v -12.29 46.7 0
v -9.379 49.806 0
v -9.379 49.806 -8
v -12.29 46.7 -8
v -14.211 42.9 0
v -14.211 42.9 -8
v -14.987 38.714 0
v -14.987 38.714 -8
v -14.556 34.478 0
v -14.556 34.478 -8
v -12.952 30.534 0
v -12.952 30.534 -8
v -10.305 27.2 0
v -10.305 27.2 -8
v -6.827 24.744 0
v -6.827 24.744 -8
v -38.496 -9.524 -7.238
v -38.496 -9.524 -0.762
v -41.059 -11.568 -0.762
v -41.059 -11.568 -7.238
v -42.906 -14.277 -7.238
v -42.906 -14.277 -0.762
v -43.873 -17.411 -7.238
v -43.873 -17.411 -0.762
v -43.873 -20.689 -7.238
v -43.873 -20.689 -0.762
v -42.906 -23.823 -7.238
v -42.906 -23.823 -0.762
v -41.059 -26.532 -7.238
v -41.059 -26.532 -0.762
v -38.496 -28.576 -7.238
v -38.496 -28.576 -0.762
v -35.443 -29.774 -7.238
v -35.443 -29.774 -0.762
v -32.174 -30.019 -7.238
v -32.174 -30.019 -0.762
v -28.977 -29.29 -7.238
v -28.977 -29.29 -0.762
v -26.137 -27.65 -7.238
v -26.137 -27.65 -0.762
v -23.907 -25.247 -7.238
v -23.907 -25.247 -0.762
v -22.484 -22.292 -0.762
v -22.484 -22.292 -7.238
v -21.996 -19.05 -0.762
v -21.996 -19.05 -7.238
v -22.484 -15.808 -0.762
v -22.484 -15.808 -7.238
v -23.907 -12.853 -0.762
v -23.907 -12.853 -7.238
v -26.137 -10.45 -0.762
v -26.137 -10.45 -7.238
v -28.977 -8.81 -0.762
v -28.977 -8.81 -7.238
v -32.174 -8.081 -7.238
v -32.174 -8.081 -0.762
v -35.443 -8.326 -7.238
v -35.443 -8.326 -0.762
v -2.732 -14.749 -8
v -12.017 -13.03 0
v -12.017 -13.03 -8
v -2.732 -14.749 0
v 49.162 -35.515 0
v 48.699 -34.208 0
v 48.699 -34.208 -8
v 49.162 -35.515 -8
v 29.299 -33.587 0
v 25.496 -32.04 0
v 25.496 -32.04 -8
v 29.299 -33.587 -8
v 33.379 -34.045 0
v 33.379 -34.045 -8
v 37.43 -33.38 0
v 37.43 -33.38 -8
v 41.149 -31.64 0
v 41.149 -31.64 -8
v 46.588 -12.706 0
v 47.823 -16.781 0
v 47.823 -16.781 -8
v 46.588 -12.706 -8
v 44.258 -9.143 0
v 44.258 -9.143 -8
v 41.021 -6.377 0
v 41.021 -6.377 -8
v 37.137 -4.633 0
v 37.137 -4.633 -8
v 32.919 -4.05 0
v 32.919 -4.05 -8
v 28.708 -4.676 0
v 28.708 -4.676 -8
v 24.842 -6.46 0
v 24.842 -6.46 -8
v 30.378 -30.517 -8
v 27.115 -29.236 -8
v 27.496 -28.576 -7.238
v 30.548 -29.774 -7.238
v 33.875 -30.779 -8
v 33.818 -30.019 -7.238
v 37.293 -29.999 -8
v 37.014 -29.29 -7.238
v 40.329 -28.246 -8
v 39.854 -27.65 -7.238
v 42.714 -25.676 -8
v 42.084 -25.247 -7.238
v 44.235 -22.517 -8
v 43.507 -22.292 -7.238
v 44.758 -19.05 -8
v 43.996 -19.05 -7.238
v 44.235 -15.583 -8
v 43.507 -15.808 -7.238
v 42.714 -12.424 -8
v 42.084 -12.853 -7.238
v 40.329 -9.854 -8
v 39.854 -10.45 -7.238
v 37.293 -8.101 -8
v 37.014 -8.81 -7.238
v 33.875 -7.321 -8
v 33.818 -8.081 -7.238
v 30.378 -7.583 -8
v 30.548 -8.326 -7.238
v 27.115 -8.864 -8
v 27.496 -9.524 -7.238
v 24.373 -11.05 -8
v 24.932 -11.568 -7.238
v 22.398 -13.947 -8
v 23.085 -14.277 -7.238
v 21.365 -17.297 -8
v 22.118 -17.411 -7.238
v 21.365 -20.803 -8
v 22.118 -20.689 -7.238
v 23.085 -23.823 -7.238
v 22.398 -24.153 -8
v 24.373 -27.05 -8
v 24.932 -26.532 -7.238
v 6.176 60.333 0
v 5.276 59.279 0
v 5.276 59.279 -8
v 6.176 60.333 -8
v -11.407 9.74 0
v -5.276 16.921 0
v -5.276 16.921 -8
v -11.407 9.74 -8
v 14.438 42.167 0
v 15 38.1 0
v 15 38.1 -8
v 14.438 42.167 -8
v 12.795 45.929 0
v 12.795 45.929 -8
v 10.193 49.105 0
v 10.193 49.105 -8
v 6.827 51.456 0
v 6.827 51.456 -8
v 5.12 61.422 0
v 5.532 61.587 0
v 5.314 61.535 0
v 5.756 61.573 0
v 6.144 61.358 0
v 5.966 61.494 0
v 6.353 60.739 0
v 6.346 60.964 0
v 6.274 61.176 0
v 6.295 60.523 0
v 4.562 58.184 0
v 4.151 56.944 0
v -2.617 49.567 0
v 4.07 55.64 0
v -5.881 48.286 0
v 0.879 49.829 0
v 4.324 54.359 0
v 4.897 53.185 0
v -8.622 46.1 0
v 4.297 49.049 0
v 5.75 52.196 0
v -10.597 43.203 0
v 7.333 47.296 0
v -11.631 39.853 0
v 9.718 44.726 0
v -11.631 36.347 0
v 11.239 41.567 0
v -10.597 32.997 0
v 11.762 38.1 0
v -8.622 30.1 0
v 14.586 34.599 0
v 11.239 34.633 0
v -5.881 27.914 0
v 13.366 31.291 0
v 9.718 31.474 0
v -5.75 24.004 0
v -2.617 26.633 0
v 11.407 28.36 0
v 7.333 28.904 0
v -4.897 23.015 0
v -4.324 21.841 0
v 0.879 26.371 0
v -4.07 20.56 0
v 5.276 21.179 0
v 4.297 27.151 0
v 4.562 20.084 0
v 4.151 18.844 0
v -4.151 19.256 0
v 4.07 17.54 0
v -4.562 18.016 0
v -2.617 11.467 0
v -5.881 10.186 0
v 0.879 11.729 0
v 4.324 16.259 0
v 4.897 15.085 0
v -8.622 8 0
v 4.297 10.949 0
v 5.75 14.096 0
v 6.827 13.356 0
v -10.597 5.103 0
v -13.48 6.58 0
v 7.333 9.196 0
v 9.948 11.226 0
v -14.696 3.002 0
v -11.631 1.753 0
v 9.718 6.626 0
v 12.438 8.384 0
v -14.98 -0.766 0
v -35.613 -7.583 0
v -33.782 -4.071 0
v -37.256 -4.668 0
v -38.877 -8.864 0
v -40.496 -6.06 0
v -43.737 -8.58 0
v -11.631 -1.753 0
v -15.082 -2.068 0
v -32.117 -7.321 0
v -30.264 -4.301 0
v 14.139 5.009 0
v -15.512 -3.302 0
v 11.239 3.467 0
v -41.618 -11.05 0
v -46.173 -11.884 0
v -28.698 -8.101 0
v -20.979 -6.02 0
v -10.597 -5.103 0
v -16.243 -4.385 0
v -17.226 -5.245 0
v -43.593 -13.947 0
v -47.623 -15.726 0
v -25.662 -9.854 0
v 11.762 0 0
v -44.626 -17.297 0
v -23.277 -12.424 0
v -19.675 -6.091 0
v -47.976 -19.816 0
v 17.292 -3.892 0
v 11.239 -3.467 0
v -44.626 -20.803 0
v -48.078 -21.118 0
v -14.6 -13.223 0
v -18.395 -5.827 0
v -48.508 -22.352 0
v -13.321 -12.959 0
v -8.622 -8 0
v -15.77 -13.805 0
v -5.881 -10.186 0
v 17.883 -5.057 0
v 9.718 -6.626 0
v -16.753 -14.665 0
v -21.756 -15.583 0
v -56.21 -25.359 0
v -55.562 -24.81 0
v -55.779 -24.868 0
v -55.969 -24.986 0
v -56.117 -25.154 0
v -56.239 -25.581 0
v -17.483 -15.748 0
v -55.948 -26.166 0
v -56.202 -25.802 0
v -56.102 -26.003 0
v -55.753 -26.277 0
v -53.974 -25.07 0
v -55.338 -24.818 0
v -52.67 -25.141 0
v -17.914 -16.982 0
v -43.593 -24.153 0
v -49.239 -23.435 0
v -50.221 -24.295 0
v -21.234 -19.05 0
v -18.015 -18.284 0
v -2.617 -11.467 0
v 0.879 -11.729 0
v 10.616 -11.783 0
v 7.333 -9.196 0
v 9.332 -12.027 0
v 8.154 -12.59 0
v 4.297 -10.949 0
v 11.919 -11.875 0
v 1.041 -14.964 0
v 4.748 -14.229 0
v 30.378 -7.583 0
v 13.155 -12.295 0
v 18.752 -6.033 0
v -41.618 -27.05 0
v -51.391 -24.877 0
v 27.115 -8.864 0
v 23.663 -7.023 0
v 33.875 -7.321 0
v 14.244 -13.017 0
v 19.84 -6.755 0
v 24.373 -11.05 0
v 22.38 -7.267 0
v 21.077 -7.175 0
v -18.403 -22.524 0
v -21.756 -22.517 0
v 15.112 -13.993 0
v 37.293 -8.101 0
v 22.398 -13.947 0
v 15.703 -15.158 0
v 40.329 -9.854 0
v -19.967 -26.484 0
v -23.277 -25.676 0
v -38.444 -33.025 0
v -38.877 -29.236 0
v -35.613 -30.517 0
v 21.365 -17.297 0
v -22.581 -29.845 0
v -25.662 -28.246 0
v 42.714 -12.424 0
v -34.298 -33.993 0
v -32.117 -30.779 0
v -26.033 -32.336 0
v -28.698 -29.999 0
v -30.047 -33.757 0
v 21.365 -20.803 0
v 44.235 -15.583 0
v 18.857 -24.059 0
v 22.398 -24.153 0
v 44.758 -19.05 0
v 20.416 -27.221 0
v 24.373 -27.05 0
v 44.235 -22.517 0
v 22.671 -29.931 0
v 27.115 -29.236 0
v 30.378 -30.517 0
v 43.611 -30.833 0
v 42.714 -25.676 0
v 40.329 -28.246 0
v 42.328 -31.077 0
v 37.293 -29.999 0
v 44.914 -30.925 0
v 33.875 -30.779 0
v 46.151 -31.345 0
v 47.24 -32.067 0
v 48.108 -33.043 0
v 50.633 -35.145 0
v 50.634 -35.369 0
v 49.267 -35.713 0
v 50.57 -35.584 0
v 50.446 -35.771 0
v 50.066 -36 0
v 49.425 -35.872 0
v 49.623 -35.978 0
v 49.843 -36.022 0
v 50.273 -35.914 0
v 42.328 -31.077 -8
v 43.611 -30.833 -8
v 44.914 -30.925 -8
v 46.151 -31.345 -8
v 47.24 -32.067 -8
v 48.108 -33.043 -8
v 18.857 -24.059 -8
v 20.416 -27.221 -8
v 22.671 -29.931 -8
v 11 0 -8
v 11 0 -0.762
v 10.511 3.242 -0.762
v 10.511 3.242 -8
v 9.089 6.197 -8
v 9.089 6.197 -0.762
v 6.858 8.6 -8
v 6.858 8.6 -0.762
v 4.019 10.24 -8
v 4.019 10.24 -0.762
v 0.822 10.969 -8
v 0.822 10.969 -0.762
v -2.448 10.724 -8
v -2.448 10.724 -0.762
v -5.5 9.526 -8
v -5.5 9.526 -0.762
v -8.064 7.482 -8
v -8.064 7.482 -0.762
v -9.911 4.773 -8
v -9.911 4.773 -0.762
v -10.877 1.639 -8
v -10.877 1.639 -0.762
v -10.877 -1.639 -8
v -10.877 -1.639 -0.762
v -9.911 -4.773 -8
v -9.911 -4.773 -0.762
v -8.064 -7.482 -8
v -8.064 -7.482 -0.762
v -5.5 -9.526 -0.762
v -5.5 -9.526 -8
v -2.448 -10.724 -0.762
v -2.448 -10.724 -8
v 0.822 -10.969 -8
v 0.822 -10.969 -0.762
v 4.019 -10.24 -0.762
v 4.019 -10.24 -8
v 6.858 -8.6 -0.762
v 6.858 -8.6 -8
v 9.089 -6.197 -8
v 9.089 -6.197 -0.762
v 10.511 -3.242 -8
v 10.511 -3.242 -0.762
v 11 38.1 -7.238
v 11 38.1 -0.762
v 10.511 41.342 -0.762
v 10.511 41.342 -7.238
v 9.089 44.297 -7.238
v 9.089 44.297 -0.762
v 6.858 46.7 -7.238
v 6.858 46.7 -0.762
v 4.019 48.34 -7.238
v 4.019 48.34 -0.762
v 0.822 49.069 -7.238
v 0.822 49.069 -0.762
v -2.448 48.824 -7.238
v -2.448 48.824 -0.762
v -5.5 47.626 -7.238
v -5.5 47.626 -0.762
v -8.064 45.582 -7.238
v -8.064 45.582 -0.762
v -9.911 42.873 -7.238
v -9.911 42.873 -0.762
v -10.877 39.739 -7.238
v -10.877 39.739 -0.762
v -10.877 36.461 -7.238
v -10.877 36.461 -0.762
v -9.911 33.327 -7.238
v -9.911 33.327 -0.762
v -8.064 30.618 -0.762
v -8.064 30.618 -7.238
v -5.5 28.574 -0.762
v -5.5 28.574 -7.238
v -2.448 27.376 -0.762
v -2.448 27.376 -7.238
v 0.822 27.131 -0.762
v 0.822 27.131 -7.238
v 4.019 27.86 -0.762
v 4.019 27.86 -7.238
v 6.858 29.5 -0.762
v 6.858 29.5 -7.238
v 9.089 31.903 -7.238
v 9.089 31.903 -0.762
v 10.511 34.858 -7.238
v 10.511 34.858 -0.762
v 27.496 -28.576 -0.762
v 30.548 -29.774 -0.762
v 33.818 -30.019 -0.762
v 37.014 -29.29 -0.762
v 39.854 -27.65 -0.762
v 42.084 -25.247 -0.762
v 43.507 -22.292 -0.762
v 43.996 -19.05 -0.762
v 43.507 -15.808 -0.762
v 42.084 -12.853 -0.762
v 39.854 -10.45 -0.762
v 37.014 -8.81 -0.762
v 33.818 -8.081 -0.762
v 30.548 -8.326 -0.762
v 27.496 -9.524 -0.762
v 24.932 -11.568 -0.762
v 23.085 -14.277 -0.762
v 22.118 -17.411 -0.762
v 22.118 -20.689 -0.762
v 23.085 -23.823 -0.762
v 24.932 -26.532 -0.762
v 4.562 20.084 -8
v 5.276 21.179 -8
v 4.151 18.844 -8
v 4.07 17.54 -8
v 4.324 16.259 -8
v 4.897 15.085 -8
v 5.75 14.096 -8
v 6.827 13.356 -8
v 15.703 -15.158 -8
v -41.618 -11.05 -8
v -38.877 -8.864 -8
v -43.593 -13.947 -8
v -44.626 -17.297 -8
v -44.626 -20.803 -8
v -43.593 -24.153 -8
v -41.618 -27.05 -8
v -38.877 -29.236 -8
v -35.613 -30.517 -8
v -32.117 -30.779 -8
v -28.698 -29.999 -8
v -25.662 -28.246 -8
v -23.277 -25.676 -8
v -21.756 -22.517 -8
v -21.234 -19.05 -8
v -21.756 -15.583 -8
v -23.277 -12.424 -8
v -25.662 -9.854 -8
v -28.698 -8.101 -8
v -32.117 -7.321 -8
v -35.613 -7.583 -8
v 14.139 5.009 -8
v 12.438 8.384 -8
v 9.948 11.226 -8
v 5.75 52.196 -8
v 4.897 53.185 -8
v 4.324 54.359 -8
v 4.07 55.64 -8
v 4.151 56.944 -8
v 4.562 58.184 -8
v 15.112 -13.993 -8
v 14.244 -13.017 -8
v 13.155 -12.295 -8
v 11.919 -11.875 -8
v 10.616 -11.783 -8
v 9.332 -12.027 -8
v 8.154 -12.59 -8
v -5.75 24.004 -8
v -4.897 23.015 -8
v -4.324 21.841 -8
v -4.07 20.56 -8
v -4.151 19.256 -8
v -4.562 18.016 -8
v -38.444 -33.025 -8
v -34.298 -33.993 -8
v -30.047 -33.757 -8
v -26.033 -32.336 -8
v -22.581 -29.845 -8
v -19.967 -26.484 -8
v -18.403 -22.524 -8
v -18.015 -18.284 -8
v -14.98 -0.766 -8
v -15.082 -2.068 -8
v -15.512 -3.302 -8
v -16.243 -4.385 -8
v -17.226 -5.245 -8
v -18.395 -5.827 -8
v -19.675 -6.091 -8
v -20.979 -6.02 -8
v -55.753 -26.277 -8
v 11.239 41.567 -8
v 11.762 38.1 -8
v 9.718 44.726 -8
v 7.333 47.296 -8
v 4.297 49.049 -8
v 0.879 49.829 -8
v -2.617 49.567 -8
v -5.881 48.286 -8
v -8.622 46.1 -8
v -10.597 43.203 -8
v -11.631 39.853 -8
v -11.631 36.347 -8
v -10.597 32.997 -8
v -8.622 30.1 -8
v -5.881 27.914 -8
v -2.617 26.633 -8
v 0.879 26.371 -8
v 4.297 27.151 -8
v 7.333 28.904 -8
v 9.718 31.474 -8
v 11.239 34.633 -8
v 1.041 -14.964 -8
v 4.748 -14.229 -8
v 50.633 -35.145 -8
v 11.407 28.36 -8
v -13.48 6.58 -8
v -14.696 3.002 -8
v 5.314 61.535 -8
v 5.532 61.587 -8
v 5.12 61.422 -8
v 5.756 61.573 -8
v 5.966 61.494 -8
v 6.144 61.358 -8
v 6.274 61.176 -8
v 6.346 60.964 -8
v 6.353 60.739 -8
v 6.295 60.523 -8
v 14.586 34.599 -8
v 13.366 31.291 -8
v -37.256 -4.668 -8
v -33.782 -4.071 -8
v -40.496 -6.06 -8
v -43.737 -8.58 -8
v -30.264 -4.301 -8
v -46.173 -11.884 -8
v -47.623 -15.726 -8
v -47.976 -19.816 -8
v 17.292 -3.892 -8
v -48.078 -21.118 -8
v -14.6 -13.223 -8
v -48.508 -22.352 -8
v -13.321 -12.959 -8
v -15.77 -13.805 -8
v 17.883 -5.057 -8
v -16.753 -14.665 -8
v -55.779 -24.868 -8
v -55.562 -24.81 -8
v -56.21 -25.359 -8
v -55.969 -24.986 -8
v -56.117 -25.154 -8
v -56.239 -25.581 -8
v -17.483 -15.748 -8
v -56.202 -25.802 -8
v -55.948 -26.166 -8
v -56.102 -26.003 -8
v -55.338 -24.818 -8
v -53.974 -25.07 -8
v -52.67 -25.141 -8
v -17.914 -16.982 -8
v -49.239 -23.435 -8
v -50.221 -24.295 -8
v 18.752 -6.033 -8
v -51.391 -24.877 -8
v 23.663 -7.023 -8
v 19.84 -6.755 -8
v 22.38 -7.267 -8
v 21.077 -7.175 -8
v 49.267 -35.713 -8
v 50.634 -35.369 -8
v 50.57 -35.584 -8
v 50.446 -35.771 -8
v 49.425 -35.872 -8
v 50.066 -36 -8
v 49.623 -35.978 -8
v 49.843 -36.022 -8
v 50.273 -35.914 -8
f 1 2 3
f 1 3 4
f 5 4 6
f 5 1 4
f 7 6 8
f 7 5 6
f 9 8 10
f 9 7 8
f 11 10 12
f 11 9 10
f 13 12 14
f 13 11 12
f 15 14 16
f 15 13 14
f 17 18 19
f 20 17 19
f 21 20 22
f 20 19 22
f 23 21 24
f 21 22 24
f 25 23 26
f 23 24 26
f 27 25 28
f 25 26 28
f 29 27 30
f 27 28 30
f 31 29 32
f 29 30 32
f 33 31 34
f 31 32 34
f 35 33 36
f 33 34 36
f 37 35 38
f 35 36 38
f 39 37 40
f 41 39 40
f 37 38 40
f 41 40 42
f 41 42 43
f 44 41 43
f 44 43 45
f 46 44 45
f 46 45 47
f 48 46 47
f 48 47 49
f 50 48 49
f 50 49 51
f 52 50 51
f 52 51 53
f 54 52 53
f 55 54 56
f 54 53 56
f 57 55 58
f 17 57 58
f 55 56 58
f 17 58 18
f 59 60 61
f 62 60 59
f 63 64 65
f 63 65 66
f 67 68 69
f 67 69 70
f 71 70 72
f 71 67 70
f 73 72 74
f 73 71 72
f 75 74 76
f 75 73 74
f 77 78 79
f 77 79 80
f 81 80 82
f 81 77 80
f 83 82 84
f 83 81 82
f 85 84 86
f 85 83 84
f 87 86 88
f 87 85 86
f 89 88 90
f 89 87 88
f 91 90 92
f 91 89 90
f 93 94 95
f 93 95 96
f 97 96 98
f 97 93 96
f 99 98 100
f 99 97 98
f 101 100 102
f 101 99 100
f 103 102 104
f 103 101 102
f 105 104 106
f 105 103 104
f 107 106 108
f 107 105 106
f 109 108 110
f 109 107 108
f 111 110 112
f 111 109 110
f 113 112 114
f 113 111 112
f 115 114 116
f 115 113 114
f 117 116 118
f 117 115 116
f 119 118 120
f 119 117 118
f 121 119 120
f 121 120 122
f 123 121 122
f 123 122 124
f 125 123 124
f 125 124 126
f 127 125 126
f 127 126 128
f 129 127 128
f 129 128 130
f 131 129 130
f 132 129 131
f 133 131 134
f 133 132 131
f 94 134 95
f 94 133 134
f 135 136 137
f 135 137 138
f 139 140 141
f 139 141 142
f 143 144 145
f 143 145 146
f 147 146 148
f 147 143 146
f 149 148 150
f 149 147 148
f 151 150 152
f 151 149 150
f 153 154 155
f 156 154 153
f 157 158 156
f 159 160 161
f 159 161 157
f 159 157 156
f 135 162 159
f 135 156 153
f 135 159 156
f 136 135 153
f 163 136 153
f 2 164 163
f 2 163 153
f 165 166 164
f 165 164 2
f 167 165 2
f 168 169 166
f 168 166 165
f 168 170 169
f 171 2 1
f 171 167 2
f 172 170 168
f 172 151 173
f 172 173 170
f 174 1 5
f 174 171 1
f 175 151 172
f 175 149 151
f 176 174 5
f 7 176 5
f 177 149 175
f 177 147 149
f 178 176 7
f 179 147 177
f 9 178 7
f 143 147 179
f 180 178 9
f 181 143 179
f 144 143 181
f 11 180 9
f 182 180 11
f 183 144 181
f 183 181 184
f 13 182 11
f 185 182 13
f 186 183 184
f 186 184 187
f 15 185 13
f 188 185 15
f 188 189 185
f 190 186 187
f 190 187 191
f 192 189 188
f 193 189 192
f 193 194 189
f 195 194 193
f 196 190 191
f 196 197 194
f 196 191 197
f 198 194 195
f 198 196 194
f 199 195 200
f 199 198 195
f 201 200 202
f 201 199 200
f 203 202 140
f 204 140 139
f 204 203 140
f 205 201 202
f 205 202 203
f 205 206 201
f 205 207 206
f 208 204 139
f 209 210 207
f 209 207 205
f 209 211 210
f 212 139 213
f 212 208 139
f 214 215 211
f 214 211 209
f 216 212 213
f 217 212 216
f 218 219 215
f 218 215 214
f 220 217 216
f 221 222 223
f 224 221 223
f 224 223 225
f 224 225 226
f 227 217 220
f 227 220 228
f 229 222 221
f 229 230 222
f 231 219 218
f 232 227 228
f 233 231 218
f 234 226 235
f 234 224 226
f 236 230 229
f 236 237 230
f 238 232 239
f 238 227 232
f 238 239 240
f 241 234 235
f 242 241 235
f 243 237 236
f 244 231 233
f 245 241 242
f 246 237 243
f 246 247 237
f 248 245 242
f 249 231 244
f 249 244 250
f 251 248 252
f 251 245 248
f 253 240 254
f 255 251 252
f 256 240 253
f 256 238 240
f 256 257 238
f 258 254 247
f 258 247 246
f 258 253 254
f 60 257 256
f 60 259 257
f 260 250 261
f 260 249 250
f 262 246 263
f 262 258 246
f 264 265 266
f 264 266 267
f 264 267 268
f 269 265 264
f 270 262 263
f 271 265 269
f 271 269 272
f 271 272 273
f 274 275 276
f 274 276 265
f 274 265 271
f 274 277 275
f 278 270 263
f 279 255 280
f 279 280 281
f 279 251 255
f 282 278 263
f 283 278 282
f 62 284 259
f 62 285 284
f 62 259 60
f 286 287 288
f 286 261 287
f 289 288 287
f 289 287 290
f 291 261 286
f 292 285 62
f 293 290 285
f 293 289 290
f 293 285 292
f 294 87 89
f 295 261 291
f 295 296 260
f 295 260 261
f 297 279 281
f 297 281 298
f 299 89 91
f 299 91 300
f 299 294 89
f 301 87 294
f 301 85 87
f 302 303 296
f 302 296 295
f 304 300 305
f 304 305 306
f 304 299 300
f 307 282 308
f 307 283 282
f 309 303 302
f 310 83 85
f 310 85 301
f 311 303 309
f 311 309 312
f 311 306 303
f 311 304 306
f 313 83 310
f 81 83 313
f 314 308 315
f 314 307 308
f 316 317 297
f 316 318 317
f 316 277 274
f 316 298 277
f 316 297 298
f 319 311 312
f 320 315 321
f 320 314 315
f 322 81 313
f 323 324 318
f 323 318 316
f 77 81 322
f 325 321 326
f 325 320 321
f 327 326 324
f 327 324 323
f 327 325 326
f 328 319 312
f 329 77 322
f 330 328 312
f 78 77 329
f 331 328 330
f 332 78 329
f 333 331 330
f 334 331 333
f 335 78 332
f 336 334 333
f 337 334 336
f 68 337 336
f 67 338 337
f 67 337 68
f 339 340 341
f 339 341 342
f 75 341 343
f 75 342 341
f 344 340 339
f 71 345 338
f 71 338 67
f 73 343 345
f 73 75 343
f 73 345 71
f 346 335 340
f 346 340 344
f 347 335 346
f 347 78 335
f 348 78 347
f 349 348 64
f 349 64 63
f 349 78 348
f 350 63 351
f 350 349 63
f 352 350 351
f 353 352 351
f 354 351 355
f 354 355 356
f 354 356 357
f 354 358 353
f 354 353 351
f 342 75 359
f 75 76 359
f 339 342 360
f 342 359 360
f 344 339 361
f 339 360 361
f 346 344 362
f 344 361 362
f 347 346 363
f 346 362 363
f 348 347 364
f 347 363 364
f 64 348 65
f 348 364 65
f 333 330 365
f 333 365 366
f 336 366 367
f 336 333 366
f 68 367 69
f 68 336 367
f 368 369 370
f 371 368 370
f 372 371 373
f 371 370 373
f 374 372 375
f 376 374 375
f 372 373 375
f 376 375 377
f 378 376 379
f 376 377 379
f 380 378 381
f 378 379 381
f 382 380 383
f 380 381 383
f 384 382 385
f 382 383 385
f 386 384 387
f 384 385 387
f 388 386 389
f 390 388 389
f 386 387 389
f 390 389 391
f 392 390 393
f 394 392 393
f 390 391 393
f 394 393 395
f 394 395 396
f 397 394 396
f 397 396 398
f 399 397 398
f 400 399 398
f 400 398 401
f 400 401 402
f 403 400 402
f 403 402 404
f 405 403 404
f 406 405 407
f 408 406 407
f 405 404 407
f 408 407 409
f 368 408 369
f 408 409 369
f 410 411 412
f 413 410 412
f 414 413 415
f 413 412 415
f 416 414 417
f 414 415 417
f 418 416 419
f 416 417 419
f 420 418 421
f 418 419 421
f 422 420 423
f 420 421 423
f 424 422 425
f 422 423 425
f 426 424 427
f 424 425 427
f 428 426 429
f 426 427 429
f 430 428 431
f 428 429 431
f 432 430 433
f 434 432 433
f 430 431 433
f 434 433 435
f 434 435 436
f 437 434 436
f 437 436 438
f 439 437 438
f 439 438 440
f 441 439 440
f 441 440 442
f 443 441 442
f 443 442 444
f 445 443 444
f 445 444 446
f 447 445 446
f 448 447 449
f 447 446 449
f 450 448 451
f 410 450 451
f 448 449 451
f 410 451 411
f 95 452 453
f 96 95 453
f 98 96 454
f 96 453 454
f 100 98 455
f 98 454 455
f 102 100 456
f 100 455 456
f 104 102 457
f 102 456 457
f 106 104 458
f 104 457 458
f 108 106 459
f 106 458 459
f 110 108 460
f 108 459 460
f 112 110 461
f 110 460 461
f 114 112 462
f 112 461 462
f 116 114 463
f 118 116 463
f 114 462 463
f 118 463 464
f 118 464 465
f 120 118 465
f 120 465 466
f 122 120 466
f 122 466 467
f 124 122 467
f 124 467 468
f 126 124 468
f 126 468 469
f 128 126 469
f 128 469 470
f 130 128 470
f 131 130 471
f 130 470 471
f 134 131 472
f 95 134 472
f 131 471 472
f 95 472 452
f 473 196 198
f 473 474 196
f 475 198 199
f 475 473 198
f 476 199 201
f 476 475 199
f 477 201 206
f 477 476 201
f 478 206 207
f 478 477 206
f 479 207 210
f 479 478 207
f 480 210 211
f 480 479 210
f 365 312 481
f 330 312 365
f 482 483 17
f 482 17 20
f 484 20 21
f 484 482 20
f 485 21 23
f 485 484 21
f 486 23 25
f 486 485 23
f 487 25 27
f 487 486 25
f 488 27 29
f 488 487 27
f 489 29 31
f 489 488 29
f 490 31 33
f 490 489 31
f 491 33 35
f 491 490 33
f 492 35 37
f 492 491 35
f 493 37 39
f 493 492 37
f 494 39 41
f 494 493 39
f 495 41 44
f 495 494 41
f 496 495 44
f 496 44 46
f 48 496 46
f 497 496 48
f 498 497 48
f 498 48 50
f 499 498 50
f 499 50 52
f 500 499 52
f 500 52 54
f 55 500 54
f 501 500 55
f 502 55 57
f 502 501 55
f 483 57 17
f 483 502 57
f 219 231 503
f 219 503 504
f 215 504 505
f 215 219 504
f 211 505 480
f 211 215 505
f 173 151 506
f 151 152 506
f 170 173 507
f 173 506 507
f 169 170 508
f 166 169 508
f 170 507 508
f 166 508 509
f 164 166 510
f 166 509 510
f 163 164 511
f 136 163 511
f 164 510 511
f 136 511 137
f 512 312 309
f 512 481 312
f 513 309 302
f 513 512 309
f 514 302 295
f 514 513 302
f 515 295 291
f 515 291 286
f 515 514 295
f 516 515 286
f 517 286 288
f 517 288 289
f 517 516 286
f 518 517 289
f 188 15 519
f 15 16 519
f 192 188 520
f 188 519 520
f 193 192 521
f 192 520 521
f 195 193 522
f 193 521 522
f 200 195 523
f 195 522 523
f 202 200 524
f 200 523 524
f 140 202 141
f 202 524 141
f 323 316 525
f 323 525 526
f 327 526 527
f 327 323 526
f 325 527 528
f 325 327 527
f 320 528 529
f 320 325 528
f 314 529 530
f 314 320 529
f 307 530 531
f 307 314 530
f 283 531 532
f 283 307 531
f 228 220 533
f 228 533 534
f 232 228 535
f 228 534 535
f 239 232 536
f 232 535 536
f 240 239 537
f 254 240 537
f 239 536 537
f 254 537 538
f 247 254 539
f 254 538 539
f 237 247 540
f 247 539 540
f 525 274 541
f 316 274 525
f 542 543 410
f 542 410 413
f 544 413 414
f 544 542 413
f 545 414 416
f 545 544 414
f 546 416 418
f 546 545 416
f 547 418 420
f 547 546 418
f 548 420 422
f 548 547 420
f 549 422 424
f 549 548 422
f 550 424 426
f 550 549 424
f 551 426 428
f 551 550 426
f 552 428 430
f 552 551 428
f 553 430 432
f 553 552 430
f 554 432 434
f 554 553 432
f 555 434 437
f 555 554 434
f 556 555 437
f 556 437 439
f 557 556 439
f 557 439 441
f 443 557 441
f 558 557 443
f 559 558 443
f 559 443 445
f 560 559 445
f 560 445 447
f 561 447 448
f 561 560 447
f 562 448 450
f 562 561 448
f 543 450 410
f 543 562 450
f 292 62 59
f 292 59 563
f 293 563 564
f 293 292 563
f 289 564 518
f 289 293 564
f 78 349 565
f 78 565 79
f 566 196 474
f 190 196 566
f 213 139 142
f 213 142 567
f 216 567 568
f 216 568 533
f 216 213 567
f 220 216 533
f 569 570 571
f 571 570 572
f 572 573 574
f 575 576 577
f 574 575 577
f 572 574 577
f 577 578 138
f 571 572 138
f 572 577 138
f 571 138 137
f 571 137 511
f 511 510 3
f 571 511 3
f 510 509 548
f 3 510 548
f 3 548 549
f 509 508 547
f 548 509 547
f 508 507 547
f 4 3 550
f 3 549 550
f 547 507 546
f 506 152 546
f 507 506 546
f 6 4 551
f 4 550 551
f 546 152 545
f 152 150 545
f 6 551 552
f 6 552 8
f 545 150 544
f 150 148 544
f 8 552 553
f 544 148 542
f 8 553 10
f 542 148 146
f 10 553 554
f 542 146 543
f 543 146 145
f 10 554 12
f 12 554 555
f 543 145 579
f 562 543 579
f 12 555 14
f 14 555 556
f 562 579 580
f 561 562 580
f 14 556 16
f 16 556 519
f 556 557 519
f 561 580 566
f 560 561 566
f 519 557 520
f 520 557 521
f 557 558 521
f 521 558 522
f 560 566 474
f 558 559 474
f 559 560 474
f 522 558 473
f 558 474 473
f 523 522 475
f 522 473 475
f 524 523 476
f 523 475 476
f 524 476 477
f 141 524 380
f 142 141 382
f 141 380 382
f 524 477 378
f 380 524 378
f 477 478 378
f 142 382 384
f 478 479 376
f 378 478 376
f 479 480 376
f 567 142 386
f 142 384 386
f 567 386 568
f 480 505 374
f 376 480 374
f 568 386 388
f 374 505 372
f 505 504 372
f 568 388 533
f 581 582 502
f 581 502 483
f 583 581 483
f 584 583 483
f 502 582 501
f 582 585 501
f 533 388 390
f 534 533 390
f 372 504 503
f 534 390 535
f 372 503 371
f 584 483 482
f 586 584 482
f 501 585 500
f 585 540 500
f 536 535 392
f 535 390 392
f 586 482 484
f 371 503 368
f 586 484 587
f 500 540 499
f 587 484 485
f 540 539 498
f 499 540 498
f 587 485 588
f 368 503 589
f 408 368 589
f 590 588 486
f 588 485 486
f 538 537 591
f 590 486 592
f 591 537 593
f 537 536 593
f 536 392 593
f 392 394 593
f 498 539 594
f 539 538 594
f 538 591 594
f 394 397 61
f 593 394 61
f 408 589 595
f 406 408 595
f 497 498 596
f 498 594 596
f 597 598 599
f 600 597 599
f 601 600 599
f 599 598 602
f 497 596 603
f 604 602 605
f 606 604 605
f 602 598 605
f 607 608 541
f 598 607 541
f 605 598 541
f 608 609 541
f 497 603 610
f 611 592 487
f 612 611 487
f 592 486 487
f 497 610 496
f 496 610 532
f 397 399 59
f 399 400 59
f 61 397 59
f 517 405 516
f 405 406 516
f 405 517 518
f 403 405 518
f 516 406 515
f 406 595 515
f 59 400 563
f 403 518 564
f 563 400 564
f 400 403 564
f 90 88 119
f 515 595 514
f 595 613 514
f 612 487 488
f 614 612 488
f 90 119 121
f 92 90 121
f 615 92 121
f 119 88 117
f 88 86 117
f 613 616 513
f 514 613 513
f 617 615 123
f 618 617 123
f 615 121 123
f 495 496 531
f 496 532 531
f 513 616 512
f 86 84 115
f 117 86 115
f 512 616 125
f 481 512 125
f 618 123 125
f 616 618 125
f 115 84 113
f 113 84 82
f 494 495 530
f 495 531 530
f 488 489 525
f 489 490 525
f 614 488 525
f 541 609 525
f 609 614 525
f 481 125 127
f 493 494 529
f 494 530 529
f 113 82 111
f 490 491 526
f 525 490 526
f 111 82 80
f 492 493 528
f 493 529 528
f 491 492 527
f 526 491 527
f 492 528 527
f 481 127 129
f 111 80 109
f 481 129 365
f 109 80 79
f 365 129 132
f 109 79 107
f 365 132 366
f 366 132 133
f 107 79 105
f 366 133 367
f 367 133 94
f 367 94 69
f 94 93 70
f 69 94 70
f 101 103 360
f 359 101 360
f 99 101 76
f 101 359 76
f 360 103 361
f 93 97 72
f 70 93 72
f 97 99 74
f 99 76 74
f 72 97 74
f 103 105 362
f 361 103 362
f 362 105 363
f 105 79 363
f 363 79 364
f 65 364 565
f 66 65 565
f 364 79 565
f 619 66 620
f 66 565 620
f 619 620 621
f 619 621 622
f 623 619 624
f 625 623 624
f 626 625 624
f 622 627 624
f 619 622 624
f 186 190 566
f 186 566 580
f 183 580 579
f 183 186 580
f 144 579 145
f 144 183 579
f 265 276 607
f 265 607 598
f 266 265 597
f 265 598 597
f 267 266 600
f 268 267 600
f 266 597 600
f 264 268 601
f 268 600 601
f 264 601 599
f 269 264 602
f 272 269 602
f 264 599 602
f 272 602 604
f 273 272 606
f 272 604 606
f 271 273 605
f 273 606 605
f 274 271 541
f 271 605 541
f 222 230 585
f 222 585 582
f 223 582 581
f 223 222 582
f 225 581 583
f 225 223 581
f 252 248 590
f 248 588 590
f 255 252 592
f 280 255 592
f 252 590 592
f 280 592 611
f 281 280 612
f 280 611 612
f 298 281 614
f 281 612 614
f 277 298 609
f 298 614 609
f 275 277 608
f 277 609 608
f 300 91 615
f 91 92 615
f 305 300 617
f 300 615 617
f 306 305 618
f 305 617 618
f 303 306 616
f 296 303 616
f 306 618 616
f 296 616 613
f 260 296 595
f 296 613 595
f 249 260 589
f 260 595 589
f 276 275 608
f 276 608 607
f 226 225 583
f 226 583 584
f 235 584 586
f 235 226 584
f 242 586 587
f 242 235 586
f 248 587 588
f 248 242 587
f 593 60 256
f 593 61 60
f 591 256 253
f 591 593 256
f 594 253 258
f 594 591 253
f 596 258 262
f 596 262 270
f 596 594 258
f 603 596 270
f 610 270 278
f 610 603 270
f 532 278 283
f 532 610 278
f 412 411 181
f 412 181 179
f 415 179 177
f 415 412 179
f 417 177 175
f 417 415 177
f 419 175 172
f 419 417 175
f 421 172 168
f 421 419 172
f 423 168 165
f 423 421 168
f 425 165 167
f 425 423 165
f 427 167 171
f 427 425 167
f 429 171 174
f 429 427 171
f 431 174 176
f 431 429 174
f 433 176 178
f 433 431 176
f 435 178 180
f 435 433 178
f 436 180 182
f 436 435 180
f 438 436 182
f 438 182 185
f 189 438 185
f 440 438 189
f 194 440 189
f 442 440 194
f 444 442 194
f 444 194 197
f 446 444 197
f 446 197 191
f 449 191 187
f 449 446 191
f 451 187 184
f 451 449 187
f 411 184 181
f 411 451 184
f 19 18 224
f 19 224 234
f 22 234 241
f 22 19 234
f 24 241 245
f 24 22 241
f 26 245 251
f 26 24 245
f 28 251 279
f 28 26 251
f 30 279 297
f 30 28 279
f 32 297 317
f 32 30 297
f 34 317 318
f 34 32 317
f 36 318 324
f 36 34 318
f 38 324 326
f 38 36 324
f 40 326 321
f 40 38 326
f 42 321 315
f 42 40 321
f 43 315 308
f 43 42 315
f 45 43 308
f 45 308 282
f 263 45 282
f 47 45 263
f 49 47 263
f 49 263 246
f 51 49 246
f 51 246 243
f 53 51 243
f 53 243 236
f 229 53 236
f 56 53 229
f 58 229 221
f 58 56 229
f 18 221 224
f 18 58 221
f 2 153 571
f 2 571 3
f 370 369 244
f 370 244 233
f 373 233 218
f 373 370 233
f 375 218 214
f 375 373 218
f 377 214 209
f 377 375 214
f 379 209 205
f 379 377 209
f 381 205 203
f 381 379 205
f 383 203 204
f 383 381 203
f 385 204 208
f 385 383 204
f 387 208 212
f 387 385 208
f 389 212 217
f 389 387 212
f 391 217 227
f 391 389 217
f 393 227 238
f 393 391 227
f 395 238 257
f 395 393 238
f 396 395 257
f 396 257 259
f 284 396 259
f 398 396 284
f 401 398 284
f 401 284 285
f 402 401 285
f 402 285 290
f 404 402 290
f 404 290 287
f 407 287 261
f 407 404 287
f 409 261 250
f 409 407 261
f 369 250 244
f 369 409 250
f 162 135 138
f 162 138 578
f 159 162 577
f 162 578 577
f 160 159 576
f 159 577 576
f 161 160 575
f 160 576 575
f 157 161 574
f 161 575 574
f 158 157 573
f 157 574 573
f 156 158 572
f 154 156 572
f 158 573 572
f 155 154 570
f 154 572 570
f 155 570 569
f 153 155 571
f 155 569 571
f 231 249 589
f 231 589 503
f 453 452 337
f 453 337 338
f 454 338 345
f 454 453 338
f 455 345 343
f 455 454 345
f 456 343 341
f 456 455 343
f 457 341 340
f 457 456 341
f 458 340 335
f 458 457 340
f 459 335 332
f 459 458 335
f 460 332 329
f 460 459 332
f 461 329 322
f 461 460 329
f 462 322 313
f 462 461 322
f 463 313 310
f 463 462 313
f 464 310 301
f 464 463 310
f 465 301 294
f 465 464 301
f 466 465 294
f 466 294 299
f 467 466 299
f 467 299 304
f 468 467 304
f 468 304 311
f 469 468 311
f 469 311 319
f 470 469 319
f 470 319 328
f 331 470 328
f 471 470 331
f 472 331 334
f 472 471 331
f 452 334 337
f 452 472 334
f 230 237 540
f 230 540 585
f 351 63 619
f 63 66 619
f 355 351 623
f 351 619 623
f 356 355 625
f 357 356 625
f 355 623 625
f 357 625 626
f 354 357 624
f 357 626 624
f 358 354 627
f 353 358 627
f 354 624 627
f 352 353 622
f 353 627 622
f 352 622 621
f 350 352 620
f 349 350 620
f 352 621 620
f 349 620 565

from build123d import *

# Parameters (mm, degrees)
F0_R            = 11
F1_DEPTH        = 8
F2_DEPTH        = 8
F2_COPIES_COUNT = 3
F3_R            = 5.08
F4_F1_R         = 0.762
F4_F2_R         = 0.762
F4_F3_R         = 0.762
F5_SIZE         = 0.762


# Not quite as in the source:
# - a pattern or mirror of a feature is missing from the dataset's text; its kind, count and spacing are read off the source's solid


with BuildPart() as f1:
    # F0 (on Top) → F1 (new body)
    with BuildSketch(Plane.XY):
        with BuildLine():
            ThreePointArc((-11.407337121, 9.7402597403), (-5.190854611, -14.0732024929), (15, 0))
            ThreePointArc((15, 0), (10.6066017178, 10.6066017178), (0, 15))
            ThreePointArc((0, 15), (-6.2807684202, 13.6217454114), (-11.407337121, 9.7402597403))
        make_face()
        Circle(F0_R, mode=Mode.SUBTRACT)
    extrude(amount=-F1_DEPTH)

    # F0 (on Top) → F2 (join, through all)
    with BuildSketch(Plane.XY):
        with BuildLine():
            ThreePointArc((-11.407337121, 9.7402597403), (-6.2807684202, 13.6217454114), (0, 15))
            Line((0, 15), (11.407337121, 28.3597402597))
            ThreePointArc((11.407337121, 28.3597402597), (6.2807684202, 24.4782545886), (0, 23.1))
            Line((0, 23.1), (-11.407337121, 9.7402597403))
        make_face()
        with BuildLine():
            ThreePointArc((0, 23.1), (6.2807684202, 24.4782545886), (11.407337121, 28.3597402597))
            ThreePointArc((11.407337121, 28.3597402597), (14.0732024929, 32.909145389), (15, 38.1))
            ThreePointArc((15, 38.1), (10.6066017178, 48.7066017178), (0, 53.1))
            ThreePointArc((0, 53.1), (-4.9701878524, 52.2526404855), (-9.378837576, 49.806297695))
            ThreePointArc((-9.378837576, 49.806297695), (-14.1526404855, 33.1298121476), (0, 23.1))
        make_face()
        with Locations((0, 38.1)):
            Circle(F0_R, mode=Mode.SUBTRACT)
        with BuildLine():
            Line((11.407337121, 66.4597402597), (-9.378837576, 49.806297695))
            ThreePointArc((-9.378837576, 49.806297695), (-4.9701878524, 52.2526404855), (0, 53.1))
            Line((0, 53.1), (11.407337121, 66.4597402597))
        make_face()
    f2 = extrude(amount=-F2_DEPTH)

    # F2_copies: F2 ×3 about axis
    f2_copies_axis = Axis((0, 0, 0), (0, 0, 1))
    for i in range(1, F2_COPIES_COUNT):
        add(f2.rotate(f2_copies_axis, i * 360 / F2_COPIES_COUNT))

    # F3
    f3_edges = [f1.edges().sort_by_distance(p)[0] for p in [
        (0, 15, -4),
        (0, 23.1, -4),
        (0, 53.1, -4),
        (20.005187, -11.55, -4),
        (-12.990381, -7.5, -4),
        (-45.985949, -26.55, -4),
        (-20.005187, -11.55, -4),
        (12.990381, -7.5, -4),
        (45.985949, -26.55, -4),
    ]]
    fillet(f3_edges, radius=F3_R)

    # F4: fillet of radius 0.762 on 3 edges, made by hand

    # F4_f1
    f4_f1_edges = [f1.edges().sort_by_distance(p)[0] for p in [
        (51.8521548333, -43.1089138662, -4),
    ]]
    fillet(f4_f1_edges, radius=F4_F1_R)

    # F4_f2
    f4_f2_edges = [f1.edges().sort_by_distance(p)[0] for p in [
        (11.407337121, 66.4597402597, -4),
    ]]
    fillet(f4_f2_edges, radius=F4_F2_R)

    # F4_f3
    f4_f3_edges = [f1.edges().sort_by_distance(p)[0] for p in [
        (-63.2594919544, -23.3508263935, -4),
    ]]
    fillet(f4_f3_edges, radius=F4_F3_R)

    # F5
    f5_edges = [f1.edges().sort_by_distance(p)[0] for p in [
        (-11, 0, 0),
        (-11, 38.1, 0),
        (-11, 38.1, -8),
        (-27.495568, -28.576279, -8),
        (38.495568, -9.523721, -8),
        (-27.495568, -28.576279, 0),
        (38.495568, -9.523721, 0),
    ]]
    chamfer(f5_edges, length=F5_SIZE)


solid = f1.part
